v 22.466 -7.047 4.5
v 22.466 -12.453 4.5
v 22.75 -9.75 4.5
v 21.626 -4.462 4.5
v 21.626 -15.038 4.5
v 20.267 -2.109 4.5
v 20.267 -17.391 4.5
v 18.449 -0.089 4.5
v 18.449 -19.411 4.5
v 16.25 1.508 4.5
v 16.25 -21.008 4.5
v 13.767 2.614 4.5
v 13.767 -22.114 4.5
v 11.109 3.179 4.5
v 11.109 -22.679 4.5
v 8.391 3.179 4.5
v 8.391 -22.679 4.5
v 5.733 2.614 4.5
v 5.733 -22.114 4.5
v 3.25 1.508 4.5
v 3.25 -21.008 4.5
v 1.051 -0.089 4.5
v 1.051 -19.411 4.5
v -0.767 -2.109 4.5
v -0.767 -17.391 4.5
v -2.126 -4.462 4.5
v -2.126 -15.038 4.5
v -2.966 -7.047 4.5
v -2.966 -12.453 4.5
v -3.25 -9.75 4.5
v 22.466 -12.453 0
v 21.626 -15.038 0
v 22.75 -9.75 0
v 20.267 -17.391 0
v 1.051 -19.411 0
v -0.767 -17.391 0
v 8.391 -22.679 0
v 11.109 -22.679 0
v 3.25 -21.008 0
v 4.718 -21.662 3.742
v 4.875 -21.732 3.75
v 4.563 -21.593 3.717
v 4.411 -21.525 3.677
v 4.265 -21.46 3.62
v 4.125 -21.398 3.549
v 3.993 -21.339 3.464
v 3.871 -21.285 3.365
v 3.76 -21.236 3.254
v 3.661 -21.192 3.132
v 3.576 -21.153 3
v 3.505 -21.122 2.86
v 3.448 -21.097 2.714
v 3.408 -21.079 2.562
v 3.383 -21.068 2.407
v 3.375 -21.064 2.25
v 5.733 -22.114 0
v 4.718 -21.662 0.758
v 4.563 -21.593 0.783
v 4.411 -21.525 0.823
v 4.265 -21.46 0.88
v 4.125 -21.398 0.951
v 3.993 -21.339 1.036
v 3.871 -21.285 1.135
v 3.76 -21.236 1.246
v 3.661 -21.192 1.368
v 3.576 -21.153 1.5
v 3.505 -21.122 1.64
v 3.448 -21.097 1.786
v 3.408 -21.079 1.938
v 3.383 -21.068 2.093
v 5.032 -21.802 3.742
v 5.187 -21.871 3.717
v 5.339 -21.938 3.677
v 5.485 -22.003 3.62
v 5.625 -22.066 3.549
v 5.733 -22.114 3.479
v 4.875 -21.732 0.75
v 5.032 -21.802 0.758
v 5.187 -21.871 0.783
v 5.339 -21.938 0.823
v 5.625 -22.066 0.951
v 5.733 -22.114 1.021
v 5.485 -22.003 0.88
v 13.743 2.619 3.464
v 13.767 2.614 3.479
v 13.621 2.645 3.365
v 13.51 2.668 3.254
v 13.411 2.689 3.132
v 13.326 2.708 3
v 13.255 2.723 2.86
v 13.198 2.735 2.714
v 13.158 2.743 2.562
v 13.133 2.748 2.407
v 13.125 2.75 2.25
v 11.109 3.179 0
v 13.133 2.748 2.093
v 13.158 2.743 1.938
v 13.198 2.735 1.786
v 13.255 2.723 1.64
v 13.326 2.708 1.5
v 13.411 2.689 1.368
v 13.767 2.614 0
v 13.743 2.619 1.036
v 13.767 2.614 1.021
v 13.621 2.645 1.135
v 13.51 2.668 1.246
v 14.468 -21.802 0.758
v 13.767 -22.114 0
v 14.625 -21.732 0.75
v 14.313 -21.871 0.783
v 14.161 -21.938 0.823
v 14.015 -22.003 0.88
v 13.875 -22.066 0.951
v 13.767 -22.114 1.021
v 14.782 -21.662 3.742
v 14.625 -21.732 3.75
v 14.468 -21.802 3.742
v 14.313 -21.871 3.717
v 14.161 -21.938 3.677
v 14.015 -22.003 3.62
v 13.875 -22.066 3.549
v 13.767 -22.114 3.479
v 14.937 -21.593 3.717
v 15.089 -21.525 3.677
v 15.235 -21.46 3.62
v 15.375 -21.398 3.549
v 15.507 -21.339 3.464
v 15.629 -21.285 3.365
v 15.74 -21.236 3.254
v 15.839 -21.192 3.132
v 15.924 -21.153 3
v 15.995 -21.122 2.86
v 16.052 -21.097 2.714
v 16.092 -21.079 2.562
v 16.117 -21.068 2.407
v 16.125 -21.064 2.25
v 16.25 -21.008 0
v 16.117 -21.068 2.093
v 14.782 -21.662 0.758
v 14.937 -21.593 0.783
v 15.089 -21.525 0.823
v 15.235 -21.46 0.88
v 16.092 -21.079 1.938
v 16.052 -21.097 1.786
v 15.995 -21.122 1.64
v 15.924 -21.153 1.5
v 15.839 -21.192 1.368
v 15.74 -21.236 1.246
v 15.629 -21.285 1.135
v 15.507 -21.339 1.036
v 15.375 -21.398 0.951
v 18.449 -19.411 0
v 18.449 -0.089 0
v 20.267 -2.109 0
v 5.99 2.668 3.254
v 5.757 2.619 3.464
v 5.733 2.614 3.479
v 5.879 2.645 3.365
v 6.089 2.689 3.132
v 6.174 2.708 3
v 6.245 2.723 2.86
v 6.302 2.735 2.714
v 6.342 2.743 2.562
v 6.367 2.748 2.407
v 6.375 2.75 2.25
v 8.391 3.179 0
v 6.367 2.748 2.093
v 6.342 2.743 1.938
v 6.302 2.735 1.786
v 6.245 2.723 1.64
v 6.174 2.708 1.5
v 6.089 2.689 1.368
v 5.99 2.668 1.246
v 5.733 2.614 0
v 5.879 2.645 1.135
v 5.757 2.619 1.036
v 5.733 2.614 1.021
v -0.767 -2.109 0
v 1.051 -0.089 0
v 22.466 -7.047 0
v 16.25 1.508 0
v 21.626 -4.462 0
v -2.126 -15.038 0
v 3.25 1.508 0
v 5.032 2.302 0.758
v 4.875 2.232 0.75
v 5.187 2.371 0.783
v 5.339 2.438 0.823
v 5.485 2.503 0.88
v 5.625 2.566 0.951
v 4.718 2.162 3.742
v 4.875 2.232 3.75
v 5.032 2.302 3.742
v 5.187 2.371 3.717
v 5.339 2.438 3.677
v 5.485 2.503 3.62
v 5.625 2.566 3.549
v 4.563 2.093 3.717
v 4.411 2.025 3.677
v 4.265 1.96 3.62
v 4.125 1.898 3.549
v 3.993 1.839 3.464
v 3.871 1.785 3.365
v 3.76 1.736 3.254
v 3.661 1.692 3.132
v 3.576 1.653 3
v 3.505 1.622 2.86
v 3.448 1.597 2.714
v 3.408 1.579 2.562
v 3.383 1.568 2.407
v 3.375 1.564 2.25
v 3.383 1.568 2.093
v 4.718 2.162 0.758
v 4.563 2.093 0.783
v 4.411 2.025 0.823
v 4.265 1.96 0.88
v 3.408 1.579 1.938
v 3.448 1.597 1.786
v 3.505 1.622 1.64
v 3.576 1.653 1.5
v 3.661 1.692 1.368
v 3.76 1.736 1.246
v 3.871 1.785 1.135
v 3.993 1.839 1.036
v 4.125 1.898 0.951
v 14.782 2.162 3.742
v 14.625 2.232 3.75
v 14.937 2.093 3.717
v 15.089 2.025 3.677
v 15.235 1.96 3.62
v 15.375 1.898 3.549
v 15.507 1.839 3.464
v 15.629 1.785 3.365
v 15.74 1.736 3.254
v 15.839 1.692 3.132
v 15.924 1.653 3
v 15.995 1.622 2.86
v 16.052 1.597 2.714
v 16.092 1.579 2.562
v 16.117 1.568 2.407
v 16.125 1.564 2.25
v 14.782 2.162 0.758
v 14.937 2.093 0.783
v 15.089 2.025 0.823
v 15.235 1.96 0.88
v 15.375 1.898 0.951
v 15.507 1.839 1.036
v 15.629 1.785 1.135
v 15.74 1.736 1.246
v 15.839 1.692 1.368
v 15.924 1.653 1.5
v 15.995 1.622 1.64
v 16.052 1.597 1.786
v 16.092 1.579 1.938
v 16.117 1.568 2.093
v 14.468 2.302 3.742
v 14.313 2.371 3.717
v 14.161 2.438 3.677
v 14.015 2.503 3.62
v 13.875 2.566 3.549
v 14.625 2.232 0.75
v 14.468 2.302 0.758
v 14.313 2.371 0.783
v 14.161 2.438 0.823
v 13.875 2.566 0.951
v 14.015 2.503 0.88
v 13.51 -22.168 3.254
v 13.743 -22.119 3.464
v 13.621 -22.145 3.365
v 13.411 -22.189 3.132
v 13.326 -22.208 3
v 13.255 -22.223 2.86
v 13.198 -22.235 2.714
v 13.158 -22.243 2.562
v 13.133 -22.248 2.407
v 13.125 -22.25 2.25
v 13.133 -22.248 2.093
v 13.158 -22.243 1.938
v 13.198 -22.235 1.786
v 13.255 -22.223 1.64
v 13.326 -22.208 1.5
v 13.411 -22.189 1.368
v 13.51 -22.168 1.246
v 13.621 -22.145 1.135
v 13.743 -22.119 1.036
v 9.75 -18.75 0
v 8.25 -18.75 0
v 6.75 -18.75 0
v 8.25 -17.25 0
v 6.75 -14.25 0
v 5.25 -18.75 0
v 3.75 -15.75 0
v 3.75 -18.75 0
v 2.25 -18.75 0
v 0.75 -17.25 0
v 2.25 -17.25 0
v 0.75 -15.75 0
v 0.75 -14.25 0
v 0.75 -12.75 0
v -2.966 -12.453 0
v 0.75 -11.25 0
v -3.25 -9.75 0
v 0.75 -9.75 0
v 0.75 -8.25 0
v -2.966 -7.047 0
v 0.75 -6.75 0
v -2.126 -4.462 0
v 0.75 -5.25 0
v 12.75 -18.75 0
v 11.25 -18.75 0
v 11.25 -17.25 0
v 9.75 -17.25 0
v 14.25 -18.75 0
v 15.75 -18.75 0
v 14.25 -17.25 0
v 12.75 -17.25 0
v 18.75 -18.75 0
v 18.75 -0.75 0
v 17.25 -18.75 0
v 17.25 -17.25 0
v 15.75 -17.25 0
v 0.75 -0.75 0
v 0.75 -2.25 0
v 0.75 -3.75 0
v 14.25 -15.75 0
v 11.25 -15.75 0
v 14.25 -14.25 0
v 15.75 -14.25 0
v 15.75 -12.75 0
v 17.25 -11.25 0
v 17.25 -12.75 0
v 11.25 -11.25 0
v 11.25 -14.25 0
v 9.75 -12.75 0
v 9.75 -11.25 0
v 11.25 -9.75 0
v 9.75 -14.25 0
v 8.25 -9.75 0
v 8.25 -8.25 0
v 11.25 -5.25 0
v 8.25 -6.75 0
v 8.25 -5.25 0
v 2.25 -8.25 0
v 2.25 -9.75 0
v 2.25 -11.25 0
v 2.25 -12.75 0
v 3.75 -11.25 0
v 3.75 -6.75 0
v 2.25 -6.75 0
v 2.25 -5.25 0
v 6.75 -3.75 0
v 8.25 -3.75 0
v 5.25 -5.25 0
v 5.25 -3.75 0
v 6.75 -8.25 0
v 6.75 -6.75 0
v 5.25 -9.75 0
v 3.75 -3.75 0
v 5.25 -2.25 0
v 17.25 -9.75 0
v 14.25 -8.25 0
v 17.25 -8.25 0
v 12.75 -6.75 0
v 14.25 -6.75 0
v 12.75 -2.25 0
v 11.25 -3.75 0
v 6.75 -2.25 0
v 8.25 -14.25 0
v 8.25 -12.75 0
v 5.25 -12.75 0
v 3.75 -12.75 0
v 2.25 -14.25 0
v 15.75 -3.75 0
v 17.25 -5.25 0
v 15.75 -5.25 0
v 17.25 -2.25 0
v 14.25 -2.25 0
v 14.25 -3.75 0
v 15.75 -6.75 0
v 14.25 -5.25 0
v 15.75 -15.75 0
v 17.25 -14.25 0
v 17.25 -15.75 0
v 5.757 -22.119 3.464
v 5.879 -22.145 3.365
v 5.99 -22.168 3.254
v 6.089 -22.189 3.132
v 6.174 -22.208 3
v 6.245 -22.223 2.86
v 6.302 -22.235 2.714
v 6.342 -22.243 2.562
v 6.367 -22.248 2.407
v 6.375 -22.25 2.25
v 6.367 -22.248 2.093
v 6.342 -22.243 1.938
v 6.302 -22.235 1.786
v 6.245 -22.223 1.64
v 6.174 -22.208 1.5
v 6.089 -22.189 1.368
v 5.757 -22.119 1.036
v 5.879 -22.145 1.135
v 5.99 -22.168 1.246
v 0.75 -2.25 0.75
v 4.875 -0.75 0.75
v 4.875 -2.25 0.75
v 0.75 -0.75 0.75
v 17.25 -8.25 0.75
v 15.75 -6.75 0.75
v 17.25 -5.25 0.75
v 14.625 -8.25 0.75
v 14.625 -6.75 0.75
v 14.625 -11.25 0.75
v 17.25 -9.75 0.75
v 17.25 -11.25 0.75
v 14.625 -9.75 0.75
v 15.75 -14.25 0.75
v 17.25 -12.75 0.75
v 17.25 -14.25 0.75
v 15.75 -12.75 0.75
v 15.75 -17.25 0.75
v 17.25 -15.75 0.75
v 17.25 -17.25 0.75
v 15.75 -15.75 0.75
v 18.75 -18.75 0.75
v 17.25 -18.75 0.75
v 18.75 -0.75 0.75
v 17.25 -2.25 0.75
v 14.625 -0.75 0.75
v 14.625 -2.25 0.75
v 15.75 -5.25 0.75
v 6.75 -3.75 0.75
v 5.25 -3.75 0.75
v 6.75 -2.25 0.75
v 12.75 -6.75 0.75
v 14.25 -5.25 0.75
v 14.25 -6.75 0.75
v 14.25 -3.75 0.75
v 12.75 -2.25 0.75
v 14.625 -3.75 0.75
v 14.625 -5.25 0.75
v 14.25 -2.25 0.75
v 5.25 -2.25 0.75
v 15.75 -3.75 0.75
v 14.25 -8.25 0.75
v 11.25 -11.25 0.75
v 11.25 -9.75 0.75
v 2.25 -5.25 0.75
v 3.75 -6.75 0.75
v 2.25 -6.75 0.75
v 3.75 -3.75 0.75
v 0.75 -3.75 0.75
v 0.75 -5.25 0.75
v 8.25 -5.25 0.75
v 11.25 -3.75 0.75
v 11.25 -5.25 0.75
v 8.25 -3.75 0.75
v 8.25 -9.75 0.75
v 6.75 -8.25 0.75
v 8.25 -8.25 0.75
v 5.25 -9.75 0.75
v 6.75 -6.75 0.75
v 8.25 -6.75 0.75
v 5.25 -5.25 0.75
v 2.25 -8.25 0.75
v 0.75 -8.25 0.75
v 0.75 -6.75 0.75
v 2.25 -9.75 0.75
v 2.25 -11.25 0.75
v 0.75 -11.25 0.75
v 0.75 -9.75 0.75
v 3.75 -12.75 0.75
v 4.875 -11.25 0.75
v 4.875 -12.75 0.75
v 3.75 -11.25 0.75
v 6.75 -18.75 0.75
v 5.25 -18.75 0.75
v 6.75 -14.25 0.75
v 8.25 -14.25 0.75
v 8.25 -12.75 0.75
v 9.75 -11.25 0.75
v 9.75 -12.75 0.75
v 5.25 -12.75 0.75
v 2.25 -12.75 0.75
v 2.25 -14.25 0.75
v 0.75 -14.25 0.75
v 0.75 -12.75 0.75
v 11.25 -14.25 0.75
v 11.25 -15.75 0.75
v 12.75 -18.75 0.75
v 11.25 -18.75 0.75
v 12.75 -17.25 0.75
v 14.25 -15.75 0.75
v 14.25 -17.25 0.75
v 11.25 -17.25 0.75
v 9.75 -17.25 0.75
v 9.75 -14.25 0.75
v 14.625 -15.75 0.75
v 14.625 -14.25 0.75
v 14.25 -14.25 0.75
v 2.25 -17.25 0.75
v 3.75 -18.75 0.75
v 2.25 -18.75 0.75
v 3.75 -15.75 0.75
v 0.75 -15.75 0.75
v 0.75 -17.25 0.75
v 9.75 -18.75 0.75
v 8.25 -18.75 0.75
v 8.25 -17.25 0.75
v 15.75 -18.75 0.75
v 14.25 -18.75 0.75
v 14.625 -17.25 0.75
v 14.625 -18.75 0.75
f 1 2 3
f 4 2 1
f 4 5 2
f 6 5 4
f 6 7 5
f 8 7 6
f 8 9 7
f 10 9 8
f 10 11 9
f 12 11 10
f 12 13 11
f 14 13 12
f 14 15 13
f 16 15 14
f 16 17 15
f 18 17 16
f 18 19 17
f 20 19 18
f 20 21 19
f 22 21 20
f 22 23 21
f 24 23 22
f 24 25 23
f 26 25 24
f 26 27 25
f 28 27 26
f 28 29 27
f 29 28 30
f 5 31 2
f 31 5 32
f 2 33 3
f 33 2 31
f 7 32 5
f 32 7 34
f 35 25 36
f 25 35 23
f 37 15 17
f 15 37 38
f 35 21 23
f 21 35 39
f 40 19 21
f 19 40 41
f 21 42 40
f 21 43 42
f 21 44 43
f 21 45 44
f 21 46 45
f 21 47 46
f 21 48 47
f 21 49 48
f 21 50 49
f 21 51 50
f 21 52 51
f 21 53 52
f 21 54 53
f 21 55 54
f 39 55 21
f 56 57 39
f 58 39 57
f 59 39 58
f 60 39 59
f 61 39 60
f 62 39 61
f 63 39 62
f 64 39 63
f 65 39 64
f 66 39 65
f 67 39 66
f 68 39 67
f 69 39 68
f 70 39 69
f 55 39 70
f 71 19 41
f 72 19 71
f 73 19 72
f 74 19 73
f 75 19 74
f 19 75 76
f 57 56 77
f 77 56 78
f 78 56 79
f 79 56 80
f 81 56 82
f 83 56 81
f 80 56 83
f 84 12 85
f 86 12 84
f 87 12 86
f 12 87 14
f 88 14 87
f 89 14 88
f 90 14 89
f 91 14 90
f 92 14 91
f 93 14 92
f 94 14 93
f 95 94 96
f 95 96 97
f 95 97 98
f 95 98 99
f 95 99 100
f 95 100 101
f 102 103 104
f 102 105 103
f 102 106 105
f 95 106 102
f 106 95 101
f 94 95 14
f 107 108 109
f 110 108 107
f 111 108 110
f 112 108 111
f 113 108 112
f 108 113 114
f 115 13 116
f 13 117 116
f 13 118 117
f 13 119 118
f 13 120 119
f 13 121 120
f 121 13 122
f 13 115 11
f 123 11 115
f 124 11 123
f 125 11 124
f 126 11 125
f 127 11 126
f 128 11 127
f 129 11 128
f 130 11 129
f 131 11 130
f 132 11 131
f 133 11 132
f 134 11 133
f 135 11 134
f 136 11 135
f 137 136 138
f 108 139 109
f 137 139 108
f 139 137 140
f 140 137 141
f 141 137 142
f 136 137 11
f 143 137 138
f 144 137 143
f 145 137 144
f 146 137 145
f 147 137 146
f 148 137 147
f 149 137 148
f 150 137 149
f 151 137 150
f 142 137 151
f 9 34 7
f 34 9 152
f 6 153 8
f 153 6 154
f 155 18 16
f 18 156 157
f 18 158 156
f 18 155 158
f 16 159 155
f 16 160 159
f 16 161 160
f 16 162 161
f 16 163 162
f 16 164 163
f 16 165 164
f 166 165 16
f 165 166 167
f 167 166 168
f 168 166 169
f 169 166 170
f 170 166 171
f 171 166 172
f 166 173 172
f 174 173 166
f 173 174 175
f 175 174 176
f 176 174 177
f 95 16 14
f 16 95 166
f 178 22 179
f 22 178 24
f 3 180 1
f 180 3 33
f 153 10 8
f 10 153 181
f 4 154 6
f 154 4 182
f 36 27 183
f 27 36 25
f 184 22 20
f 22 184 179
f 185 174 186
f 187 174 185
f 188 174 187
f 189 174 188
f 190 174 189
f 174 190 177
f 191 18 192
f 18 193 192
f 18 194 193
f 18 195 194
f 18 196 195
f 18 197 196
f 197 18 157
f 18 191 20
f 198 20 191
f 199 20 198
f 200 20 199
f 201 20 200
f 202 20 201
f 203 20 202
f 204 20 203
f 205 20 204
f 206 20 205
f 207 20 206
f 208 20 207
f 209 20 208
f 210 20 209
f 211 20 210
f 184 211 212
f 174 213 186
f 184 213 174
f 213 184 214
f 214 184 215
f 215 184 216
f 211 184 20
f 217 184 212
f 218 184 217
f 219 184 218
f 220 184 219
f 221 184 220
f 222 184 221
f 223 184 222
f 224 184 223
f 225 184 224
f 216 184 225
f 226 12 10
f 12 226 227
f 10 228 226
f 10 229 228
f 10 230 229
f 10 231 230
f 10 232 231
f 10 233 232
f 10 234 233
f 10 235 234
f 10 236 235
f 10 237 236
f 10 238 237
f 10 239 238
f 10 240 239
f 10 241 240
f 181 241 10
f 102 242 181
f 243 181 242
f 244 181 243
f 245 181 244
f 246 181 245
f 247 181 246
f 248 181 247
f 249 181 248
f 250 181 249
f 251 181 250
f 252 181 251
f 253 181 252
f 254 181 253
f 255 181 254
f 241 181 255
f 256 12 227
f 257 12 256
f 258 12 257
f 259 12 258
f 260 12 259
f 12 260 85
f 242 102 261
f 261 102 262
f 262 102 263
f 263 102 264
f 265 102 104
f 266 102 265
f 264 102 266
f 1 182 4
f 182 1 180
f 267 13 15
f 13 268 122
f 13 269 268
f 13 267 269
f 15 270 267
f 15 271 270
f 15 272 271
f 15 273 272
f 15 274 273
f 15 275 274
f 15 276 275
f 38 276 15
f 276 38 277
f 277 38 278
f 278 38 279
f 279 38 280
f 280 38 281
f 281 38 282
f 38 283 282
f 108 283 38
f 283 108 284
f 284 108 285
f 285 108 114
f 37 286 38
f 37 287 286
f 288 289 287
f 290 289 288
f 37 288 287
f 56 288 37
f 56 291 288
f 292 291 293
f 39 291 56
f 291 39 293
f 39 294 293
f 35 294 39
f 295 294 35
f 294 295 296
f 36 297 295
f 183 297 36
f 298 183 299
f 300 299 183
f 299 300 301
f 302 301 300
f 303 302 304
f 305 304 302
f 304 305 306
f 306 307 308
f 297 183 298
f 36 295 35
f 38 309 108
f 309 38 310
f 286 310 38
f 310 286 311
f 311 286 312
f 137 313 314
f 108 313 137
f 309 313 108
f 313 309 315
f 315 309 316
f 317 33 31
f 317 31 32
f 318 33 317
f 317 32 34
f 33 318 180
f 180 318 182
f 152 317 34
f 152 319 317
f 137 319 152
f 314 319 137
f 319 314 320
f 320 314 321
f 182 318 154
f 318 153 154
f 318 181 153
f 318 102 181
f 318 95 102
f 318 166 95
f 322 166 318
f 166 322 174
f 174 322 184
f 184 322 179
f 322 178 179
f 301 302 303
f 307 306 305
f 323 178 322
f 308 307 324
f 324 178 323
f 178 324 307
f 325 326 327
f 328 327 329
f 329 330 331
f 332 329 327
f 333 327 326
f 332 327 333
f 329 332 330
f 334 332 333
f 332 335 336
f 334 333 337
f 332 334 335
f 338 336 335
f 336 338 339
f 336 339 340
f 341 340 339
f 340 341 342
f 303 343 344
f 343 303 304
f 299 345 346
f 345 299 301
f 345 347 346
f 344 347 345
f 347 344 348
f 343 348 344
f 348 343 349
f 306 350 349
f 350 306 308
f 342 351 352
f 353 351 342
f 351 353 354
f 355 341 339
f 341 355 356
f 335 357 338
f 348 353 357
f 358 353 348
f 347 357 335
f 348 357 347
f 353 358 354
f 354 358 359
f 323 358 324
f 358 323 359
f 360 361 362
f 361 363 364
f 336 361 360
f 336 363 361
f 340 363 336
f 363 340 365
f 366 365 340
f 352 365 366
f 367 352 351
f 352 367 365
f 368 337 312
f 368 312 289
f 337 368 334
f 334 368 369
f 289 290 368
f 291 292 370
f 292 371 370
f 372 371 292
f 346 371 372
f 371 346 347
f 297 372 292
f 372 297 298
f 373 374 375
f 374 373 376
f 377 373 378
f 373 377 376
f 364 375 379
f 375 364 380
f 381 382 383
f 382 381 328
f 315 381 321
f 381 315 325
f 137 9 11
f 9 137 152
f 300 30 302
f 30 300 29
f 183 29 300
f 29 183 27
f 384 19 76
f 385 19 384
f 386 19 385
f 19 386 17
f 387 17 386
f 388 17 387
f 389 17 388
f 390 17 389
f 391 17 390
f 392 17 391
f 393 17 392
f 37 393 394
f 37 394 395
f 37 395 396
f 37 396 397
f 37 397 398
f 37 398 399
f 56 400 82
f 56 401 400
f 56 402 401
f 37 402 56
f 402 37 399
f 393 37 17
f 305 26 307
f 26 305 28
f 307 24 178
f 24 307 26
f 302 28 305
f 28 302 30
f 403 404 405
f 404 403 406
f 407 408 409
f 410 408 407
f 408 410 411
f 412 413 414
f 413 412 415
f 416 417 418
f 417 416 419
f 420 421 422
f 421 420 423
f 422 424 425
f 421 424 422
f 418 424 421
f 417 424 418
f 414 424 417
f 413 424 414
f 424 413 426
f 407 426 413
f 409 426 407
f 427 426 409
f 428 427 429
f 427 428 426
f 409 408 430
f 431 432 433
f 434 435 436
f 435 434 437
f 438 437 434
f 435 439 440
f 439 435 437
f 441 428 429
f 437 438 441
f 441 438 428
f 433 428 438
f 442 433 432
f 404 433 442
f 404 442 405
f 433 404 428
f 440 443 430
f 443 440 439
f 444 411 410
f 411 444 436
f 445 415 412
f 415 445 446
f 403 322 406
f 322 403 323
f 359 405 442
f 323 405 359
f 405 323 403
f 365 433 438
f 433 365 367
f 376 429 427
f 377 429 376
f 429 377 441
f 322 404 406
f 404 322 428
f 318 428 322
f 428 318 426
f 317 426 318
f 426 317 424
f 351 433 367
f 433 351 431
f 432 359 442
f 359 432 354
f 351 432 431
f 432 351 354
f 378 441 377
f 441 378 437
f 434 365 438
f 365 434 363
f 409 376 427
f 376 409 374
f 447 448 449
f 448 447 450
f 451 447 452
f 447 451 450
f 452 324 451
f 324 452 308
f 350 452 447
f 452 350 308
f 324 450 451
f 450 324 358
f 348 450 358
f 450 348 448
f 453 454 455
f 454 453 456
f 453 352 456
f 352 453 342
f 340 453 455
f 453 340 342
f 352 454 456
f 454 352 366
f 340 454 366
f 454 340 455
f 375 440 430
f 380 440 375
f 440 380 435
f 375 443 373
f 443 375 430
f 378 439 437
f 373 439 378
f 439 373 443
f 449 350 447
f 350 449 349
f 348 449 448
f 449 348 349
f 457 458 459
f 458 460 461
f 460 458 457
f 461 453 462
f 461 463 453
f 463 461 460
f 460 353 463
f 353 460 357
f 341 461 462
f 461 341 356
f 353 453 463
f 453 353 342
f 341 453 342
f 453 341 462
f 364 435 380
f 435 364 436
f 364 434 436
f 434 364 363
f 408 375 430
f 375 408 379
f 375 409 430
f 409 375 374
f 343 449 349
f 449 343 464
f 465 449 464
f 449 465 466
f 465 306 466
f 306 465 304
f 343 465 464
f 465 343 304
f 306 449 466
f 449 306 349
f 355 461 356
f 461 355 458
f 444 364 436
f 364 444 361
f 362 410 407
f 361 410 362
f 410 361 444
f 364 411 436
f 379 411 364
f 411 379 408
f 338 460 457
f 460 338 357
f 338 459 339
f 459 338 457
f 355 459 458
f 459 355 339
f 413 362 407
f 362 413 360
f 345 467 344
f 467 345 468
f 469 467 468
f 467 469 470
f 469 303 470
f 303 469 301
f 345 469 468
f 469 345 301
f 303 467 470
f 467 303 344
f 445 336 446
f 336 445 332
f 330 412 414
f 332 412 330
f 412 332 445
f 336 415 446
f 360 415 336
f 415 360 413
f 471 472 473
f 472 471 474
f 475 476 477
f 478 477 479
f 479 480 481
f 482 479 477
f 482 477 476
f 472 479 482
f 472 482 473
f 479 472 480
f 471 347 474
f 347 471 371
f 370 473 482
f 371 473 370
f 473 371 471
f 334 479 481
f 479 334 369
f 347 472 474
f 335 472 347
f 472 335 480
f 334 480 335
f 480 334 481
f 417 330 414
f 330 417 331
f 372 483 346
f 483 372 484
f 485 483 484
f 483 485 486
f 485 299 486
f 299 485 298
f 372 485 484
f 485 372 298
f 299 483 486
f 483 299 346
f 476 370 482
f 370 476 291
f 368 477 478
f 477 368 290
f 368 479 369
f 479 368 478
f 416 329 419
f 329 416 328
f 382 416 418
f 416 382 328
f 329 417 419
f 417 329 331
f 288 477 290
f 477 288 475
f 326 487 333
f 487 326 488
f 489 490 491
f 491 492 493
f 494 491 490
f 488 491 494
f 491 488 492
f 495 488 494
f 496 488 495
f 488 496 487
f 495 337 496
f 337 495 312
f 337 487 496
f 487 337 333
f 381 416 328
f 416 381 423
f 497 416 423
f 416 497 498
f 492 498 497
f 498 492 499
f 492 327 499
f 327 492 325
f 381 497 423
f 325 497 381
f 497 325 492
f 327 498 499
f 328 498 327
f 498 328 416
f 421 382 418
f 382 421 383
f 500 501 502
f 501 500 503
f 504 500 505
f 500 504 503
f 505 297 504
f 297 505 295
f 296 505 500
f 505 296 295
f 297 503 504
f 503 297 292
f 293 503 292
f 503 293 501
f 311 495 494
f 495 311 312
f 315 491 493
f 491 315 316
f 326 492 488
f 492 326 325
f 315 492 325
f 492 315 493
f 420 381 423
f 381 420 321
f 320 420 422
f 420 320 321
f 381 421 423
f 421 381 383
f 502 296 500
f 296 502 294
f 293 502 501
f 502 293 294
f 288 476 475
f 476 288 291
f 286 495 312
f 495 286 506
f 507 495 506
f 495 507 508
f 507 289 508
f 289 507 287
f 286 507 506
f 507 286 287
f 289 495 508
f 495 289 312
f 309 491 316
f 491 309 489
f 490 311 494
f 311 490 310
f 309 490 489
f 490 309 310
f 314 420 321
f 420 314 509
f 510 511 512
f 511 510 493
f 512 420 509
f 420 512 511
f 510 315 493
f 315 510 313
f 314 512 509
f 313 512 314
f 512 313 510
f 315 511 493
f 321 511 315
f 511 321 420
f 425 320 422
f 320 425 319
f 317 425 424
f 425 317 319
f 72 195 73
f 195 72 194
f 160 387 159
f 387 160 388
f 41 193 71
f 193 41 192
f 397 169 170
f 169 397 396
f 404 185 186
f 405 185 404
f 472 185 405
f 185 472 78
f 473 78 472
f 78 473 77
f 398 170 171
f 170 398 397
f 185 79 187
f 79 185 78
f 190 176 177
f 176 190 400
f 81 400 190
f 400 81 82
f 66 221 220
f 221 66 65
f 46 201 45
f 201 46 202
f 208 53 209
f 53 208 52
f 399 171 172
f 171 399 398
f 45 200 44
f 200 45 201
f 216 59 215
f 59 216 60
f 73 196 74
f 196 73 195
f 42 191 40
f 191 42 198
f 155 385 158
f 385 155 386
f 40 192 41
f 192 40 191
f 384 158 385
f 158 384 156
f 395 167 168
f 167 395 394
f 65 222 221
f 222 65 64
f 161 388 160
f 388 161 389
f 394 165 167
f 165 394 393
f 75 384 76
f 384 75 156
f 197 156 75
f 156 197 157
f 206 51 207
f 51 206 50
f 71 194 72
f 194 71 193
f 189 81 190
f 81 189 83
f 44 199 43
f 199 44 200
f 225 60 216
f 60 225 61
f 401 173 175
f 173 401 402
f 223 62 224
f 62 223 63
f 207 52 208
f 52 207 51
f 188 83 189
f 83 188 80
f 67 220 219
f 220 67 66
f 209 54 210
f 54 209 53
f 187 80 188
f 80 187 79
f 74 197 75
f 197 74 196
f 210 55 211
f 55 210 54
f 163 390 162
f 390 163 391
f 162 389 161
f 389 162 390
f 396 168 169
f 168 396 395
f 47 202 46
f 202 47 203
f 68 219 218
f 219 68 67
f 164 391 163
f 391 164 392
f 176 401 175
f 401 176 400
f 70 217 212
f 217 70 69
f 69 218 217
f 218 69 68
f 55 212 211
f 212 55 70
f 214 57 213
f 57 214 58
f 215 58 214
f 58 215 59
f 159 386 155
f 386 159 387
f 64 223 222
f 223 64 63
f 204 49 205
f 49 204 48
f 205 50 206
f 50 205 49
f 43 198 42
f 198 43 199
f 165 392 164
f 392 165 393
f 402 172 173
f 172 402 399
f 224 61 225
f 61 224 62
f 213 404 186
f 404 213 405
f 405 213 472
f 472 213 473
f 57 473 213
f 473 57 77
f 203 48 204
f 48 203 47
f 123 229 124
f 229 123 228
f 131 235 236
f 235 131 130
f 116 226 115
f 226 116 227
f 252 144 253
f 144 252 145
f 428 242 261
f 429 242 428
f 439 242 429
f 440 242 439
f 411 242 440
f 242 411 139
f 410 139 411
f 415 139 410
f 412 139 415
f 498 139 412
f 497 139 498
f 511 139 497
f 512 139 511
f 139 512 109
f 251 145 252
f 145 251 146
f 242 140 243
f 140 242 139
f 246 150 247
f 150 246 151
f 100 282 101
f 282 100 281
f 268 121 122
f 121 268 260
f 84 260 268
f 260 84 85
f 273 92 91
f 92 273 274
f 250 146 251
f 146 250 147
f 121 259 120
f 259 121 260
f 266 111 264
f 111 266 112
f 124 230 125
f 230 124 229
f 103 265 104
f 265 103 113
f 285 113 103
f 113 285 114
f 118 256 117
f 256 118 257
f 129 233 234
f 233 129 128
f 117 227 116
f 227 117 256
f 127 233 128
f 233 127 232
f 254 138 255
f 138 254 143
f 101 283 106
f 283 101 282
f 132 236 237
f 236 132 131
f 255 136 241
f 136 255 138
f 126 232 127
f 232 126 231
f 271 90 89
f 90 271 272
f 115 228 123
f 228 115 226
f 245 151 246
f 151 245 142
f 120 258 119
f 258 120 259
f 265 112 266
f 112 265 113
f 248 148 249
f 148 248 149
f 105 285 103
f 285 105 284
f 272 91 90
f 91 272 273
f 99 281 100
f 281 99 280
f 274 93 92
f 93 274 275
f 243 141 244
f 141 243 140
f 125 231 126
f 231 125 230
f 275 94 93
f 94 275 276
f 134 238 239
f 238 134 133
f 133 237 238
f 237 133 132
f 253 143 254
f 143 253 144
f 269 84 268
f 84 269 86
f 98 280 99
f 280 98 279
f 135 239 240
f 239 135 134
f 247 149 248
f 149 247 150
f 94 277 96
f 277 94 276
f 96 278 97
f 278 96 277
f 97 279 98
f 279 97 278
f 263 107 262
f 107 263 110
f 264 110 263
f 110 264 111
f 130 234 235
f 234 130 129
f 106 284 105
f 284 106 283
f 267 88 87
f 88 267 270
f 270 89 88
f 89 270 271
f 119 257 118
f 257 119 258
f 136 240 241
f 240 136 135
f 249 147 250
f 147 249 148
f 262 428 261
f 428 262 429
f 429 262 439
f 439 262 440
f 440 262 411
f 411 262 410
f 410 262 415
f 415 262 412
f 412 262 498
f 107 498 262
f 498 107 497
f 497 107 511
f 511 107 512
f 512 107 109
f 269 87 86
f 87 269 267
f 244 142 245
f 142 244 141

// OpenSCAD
rotate([180,0,0])difference(){translate([9.75,9.75,-2.25])  cylinder(r=13,h=4.5, center=true);
translate([1.5,1.5,0])  cube(size = [1.5,1.5,1.5], center=true);
translate([3,1.5,0])  cube(size = [1.5,1.5,1.5], center=true);
translate([4.5,1.5,0])  cube(size = [1.5,1.5,1.5], center=true);
translate([6,1.5,0])  cube(size = [1.5,1.5,1.5], center=true);
translate([7.5,1.5,0])  cube(size = [1.5,1.5,1.5], center=true);
translate([9,1.5,0])  cube(size = [1.5,1.5,1.5], center=true);
translate([10.5,1.5,0])  cube(size = [1.5,1.5,1.5], center=true);
translate([12,1.5,0])  cube(size = [1.5,1.5,1.5], center=true);
translate([13.5,1.5,0])  cube(size = [1.5,1.5,1.5], center=true);
translate([15,1.5,0])  cube(size = [1.5,1.5,1.5], center=true);
translate([16.5,1.5,0])  cube(size = [1.5,1.5,1.5], center=true);
translate([18,1.5,0])  cube(size = [1.5,1.5,1.5], center=true);
translate([18,1.5,0])  cube(size = [1.5,1.5,1.5], center=true);
translate([18,1.5,0])  cube(size = [1.5,1.5,1.5], center=true);
translate([18,1.5,0])  cube(size = [1.5,1.5,1.5], center=true);
translate([6,3,0])  cube(size = [1.5,1.5,1.5], center=true);
translate([6,3,0])  cube(size = [1.5,1.5,1.5], center=true);
translate([6,3,0])  cube(size = [1.5,1.5,1.5], center=true);
translate([6,3,0])  cube(size = [1.5,1.5,1.5], center=true);
translate([6,3,0])  cube(size = [1.5,1.5,1.5], center=true);
translate([13.5,3,0])  cube(size = [1.5,1.5,1.5], center=true);
translate([13.5,3,0])  cube(size = [1.5,1.5,1.5], center=true);
translate([13.5,3,0])  cube(size = [1.5,1.5,1.5], center=true);
translate([18,3,0])  cube(size = [1.5,1.5,1.5], center=true);
translate([1.5,4.5,0])  cube(size = [1.5,1.5,1.5], center=true);
translate([3,4.5,0])  cube(size = [1.5,1.5,1.5], center=true);
translate([3,4.5,0])  cube(size = [1.5,1.5,1.5], center=true);
translate([3,4.5,0])  cube(size = [1.5,1.5,1.5], center=true);
translate([3,4.5,0])  cube(size = [1.5,1.5,1.5], center=true);
translate([9,4.5,0])  cube(size = [1.5,1.5,1.5], center=true);
translate([10.5,4.5,0])  cube(size = [1.5,1.5,1.5], center=true);
translate([10.5,4.5,0])  cube(size = [1.5,1.5,1.5], center=true);
translate([13.5,4.5,0])  cube(size = [1.5,1.5,1.5], center=true);
translate([15,4.5,0])  cube(size = [1.5,1.5,1.5], center=true);
translate([15,4.5,0])  cube(size = [1.5,1.5,1.5], center=true);
translate([18,4.5,0])  cube(size = [1.5,1.5,1.5], center=true);
translate([18,4.5,0])  cube(size = [1.5,1.5,1.5], center=true);
translate([3,6,0])  cube(size = [1.5,1.5,1.5], center=true);
translate([3,6,0])  cube(size = [1.5,1.5,1.5], center=true);
translate([6,6,0])  cube(size = [1.5,1.5,1.5], center=true);
translate([7.5,6,0])  cube(size = [1.5,1.5,1.5], center=true);
translate([7.5,6,0])  cube(size = [1.5,1.5,1.5], center=true);
translate([7.5,6,0])  cube(size = [1.5,1.5,1.5], center=true);
translate([7.5,6,0])  cube(size = [1.5,1.5,1.5], center=true);
translate([13.5,6,0])  cube(size = [1.5,1.5,1.5], center=true);
translate([13.5,6,0])  cube(size = [1.5,1.5,1.5], center=true);
translate([16.5,6,0])  cube(size = [1.5,1.5,1.5], center=true);
translate([18,6,0])  cube(size = [1.5,1.5,1.5], center=true);
translate([1.5,7.5,0])  cube(size = [1.5,1.5,1.5], center=true);
translate([1.5,7.5,0])  cube(size = [1.5,1.5,1.5], center=true);
translate([1.5,7.5,0])  cube(size = [1.5,1.5,1.5], center=true);
translate([6,7.5,0])  cube(size = [1.5,1.5,1.5], center=true);
translate([6,7.5,0])  cube(size = [1.5,1.5,1.5], center=true);
translate([6,7.5,0])  cube(size = [1.5,1.5,1.5], center=true);
translate([6,7.5,0])  cube(size = [1.5,1.5,1.5], center=true);
translate([6,7.5,0])  cube(size = [1.5,1.5,1.5], center=true);
translate([6,7.5,0])  cube(size = [1.5,1.5,1.5], center=true);
translate([15,7.5,0])  cube(size = [1.5,1.5,1.5], center=true);
translate([16.5,7.5,0])  cube(size = [1.5,1.5,1.5], center=true);
translate([18,7.5,0])  cube(size = [1.5,1.5,1.5], center=true);
translate([18,7.5,0])  cube(size = [1.5,1.5,1.5], center=true);
translate([18,7.5,0])  cube(size = [1.5,1.5,1.5], center=true);
translate([18,7.5,0])  cube(size = [1.5,1.5,1.5], center=true);
translate([6,9,0])  cube(size = [1.5,1.5,1.5], center=true);
translate([7.5,9,0])  cube(size = [1.5,1.5,1.5], center=true);
translate([7.5,9,0])  cube(size = [1.5,1.5,1.5], center=true);
translate([7.5,9,0])  cube(size = [1.5,1.5,1.5], center=true);
translate([7.5,9,0])  cube(size = [1.5,1.5,1.5], center=true);
translate([7.5,9,0])  cube(size = [1.5,1.5,1.5], center=true);
translate([7.5,9,0])  cube(size = [1.5,1.5,1.5], center=true);
translate([7.5,9,0])  cube(size = [1.5,1.5,1.5], center=true);
translate([18,9,0])  cube(size = [1.5,1.5,1.5], center=true);
translate([1.5,10.5,0])  cube(size = [1.5,1.5,1.5], center=true);
translate([1.5,10.5,0])  cube(size = [1.5,1.5,1.5], center=true);
translate([1.5,10.5,0])  cube(size = [1.5,1.5,1.5], center=true);
translate([1.5,10.5,0])  cube(size = [1.5,1.5,1.5], center=true);
translate([1.5,10.5,0])  cube(size = [1.5,1.5,1.5], center=true);
translate([1.5,10.5,0])  cube(size = [1.5,1.5,1.5], center=true);
translate([1.5,10.5,0])  cube(size = [1.5,1.5,1.5], center=true);
translate([12,10.5,0])  cube(size = [1.5,1.5,1.5], center=true);
translate([13.5,10.5,0])  cube(size = [1.5,1.5,1.5], center=true);
translate([15,10.5,0])  cube(size = [1.5,1.5,1.5], center=true);
translate([16.5,10.5,0])  cube(size = [1.5,1.5,1.5], center=true);
translate([18,10.5,0])  cube(size = [1.5,1.5,1.5], center=true);
translate([18,10.5,0])  cube(size = [1.5,1.5,1.5], center=true);
translate([18,10.5,0])  cube(size = [1.5,1.5,1.5], center=true);
translate([4.5,12,0])  cube(size = [1.5,1.5,1.5], center=true);
translate([6,12,0])  cube(size = [1.5,1.5,1.5], center=true);
translate([7.5,12,0])  cube(size = [1.5,1.5,1.5], center=true);
translate([9,12,0])  cube(size = [1.5,1.5,1.5], center=true);
translate([9,12,0])  cube(size = [1.5,1.5,1.5], center=true);
translate([9,12,0])  cube(size = [1.5,1.5,1.5], center=true);
translate([9,12,0])  cube(size = [1.5,1.5,1.5], center=true);
translate([9,12,0])  cube(size = [1.5,1.5,1.5], center=true);
translate([9,12,0])  cube(size = [1.5,1.5,1.5], center=true);
translate([18,12,0])  cube(size = [1.5,1.5,1.5], center=true);
translate([1.5,13.5,0])  cube(size = [1.5,1.5,1.5], center=true);
translate([1.5,13.5,0])  cube(size = [1.5,1.5,1.5], center=true);
translate([1.5,13.5,0])  cube(size = [1.5,1.5,1.5], center=true);
translate([6,13.5,0])  cube(size = [1.5,1.5,1.5], center=true);
translate([7.5,13.5,0])  cube(size = [1.5,1.5,1.5], center=true);
translate([7.5,13.5,0])  cube(size = [1.5,1.5,1.5], center=true);
translate([7.5,13.5,0])  cube(size = [1.5,1.5,1.5], center=true);
translate([7.5,13.5,0])  cube(size = [1.5,1.5,1.5], center=true);
translate([7.5,13.5,0])  cube(size = [1.5,1.5,1.5], center=true);
translate([7.5,13.5,0])  cube(size = [1.5,1.5,1.5], center=true);
translate([16.5,13.5,0])  cube(size = [1.5,1.5,1.5], center=true);
translate([18,13.5,0])  cube(size = [1.5,1.5,1.5], center=true);
translate([18,13.5,0])  cube(size = [1.5,1.5,1.5], center=true);
translate([18,13.5,0])  cube(size = [1.5,1.5,1.5], center=true);
translate([18,13.5,0])  cube(size = [1.5,1.5,1.5], center=true);
translate([6,15,0])  cube(size = [1.5,1.5,1.5], center=true);
translate([6,15,0])  cube(size = [1.5,1.5,1.5], center=true);
translate([6,15,0])  cube(size = [1.5,1.5,1.5], center=true);
translate([10.5,15,0])  cube(size = [1.5,1.5,1.5], center=true);
translate([10.5,15,0])  cube(size = [1.5,1.5,1.5], center=true);
translate([10.5,15,0])  cube(size = [1.5,1.5,1.5], center=true);
translate([15,15,0])  cube(size = [1.5,1.5,1.5], center=true);
translate([15,15,0])  cube(size = [1.5,1.5,1.5], center=true);
translate([18,15,0])  cube(size = [1.5,1.5,1.5], center=true);
translate([1.5,16.5,0])  cube(size = [1.5,1.5,1.5], center=true);
translate([3,16.5,0])  cube(size = [1.5,1.5,1.5], center=true);
translate([3,16.5,0])  cube(size = [1.5,1.5,1.5], center=true);
translate([6,16.5,0])  cube(size = [1.5,1.5,1.5], center=true);
translate([6,16.5,0])  cube(size = [1.5,1.5,1.5], center=true);
translate([6,16.5,0])  cube(size = [1.5,1.5,1.5], center=true);
translate([10.5,16.5,0])  cube(size = [1.5,1.5,1.5], center=true);
translate([12,16.5,0])  cube(size = [1.5,1.5,1.5], center=true);
translate([13.5,16.5,0])  cube(size = [1.5,1.5,1.5], center=true);
translate([13.5,16.5,0])  cube(size = [1.5,1.5,1.5], center=true);
translate([16.5,16.5,0])  cube(size = [1.5,1.5,1.5], center=true);
translate([18,16.5,0])  cube(size = [1.5,1.5,1.5], center=true);
translate([18,16.5,0])  cube(size = [1.5,1.5,1.5], center=true);
translate([3,18,0])  cube(size = [1.5,1.5,1.5], center=true);
translate([3,18,0])  cube(size = [1.5,1.5,1.5], center=true);
translate([6,18,0])  cube(size = [1.5,1.5,1.5], center=true);
translate([6,18,0])  cube(size = [1.5,1.5,1.5], center=true);
translate([9,18,0])  cube(size = [1.5,1.5,1.5], center=true);
translate([9,18,0])  cube(size = [1.5,1.5,1.5], center=true);
translate([12,18,0])  cube(size = [1.5,1.5,1.5], center=true);
translate([12,18,0])  cube(size = [1.5,1.5,1.5], center=true);
translate([15,18,0])  cube(size = [1.5,1.5,1.5], center=true);
translate([15,18,0])  cube(size = [1.5,1.5,1.5], center=true);
translate([18,18,0])  cube(size = [1.5,1.5,1.5], center=true);
rotate([90,90,0])translate([2.25,4.875,0])  cylinder(r=1.5,h=400, $fn=60, center=true);
rotate([90,90,0])translate([2.25,14.625,0])  cylinder(r=1.5,h=400, $fn=60, center=true);
}
